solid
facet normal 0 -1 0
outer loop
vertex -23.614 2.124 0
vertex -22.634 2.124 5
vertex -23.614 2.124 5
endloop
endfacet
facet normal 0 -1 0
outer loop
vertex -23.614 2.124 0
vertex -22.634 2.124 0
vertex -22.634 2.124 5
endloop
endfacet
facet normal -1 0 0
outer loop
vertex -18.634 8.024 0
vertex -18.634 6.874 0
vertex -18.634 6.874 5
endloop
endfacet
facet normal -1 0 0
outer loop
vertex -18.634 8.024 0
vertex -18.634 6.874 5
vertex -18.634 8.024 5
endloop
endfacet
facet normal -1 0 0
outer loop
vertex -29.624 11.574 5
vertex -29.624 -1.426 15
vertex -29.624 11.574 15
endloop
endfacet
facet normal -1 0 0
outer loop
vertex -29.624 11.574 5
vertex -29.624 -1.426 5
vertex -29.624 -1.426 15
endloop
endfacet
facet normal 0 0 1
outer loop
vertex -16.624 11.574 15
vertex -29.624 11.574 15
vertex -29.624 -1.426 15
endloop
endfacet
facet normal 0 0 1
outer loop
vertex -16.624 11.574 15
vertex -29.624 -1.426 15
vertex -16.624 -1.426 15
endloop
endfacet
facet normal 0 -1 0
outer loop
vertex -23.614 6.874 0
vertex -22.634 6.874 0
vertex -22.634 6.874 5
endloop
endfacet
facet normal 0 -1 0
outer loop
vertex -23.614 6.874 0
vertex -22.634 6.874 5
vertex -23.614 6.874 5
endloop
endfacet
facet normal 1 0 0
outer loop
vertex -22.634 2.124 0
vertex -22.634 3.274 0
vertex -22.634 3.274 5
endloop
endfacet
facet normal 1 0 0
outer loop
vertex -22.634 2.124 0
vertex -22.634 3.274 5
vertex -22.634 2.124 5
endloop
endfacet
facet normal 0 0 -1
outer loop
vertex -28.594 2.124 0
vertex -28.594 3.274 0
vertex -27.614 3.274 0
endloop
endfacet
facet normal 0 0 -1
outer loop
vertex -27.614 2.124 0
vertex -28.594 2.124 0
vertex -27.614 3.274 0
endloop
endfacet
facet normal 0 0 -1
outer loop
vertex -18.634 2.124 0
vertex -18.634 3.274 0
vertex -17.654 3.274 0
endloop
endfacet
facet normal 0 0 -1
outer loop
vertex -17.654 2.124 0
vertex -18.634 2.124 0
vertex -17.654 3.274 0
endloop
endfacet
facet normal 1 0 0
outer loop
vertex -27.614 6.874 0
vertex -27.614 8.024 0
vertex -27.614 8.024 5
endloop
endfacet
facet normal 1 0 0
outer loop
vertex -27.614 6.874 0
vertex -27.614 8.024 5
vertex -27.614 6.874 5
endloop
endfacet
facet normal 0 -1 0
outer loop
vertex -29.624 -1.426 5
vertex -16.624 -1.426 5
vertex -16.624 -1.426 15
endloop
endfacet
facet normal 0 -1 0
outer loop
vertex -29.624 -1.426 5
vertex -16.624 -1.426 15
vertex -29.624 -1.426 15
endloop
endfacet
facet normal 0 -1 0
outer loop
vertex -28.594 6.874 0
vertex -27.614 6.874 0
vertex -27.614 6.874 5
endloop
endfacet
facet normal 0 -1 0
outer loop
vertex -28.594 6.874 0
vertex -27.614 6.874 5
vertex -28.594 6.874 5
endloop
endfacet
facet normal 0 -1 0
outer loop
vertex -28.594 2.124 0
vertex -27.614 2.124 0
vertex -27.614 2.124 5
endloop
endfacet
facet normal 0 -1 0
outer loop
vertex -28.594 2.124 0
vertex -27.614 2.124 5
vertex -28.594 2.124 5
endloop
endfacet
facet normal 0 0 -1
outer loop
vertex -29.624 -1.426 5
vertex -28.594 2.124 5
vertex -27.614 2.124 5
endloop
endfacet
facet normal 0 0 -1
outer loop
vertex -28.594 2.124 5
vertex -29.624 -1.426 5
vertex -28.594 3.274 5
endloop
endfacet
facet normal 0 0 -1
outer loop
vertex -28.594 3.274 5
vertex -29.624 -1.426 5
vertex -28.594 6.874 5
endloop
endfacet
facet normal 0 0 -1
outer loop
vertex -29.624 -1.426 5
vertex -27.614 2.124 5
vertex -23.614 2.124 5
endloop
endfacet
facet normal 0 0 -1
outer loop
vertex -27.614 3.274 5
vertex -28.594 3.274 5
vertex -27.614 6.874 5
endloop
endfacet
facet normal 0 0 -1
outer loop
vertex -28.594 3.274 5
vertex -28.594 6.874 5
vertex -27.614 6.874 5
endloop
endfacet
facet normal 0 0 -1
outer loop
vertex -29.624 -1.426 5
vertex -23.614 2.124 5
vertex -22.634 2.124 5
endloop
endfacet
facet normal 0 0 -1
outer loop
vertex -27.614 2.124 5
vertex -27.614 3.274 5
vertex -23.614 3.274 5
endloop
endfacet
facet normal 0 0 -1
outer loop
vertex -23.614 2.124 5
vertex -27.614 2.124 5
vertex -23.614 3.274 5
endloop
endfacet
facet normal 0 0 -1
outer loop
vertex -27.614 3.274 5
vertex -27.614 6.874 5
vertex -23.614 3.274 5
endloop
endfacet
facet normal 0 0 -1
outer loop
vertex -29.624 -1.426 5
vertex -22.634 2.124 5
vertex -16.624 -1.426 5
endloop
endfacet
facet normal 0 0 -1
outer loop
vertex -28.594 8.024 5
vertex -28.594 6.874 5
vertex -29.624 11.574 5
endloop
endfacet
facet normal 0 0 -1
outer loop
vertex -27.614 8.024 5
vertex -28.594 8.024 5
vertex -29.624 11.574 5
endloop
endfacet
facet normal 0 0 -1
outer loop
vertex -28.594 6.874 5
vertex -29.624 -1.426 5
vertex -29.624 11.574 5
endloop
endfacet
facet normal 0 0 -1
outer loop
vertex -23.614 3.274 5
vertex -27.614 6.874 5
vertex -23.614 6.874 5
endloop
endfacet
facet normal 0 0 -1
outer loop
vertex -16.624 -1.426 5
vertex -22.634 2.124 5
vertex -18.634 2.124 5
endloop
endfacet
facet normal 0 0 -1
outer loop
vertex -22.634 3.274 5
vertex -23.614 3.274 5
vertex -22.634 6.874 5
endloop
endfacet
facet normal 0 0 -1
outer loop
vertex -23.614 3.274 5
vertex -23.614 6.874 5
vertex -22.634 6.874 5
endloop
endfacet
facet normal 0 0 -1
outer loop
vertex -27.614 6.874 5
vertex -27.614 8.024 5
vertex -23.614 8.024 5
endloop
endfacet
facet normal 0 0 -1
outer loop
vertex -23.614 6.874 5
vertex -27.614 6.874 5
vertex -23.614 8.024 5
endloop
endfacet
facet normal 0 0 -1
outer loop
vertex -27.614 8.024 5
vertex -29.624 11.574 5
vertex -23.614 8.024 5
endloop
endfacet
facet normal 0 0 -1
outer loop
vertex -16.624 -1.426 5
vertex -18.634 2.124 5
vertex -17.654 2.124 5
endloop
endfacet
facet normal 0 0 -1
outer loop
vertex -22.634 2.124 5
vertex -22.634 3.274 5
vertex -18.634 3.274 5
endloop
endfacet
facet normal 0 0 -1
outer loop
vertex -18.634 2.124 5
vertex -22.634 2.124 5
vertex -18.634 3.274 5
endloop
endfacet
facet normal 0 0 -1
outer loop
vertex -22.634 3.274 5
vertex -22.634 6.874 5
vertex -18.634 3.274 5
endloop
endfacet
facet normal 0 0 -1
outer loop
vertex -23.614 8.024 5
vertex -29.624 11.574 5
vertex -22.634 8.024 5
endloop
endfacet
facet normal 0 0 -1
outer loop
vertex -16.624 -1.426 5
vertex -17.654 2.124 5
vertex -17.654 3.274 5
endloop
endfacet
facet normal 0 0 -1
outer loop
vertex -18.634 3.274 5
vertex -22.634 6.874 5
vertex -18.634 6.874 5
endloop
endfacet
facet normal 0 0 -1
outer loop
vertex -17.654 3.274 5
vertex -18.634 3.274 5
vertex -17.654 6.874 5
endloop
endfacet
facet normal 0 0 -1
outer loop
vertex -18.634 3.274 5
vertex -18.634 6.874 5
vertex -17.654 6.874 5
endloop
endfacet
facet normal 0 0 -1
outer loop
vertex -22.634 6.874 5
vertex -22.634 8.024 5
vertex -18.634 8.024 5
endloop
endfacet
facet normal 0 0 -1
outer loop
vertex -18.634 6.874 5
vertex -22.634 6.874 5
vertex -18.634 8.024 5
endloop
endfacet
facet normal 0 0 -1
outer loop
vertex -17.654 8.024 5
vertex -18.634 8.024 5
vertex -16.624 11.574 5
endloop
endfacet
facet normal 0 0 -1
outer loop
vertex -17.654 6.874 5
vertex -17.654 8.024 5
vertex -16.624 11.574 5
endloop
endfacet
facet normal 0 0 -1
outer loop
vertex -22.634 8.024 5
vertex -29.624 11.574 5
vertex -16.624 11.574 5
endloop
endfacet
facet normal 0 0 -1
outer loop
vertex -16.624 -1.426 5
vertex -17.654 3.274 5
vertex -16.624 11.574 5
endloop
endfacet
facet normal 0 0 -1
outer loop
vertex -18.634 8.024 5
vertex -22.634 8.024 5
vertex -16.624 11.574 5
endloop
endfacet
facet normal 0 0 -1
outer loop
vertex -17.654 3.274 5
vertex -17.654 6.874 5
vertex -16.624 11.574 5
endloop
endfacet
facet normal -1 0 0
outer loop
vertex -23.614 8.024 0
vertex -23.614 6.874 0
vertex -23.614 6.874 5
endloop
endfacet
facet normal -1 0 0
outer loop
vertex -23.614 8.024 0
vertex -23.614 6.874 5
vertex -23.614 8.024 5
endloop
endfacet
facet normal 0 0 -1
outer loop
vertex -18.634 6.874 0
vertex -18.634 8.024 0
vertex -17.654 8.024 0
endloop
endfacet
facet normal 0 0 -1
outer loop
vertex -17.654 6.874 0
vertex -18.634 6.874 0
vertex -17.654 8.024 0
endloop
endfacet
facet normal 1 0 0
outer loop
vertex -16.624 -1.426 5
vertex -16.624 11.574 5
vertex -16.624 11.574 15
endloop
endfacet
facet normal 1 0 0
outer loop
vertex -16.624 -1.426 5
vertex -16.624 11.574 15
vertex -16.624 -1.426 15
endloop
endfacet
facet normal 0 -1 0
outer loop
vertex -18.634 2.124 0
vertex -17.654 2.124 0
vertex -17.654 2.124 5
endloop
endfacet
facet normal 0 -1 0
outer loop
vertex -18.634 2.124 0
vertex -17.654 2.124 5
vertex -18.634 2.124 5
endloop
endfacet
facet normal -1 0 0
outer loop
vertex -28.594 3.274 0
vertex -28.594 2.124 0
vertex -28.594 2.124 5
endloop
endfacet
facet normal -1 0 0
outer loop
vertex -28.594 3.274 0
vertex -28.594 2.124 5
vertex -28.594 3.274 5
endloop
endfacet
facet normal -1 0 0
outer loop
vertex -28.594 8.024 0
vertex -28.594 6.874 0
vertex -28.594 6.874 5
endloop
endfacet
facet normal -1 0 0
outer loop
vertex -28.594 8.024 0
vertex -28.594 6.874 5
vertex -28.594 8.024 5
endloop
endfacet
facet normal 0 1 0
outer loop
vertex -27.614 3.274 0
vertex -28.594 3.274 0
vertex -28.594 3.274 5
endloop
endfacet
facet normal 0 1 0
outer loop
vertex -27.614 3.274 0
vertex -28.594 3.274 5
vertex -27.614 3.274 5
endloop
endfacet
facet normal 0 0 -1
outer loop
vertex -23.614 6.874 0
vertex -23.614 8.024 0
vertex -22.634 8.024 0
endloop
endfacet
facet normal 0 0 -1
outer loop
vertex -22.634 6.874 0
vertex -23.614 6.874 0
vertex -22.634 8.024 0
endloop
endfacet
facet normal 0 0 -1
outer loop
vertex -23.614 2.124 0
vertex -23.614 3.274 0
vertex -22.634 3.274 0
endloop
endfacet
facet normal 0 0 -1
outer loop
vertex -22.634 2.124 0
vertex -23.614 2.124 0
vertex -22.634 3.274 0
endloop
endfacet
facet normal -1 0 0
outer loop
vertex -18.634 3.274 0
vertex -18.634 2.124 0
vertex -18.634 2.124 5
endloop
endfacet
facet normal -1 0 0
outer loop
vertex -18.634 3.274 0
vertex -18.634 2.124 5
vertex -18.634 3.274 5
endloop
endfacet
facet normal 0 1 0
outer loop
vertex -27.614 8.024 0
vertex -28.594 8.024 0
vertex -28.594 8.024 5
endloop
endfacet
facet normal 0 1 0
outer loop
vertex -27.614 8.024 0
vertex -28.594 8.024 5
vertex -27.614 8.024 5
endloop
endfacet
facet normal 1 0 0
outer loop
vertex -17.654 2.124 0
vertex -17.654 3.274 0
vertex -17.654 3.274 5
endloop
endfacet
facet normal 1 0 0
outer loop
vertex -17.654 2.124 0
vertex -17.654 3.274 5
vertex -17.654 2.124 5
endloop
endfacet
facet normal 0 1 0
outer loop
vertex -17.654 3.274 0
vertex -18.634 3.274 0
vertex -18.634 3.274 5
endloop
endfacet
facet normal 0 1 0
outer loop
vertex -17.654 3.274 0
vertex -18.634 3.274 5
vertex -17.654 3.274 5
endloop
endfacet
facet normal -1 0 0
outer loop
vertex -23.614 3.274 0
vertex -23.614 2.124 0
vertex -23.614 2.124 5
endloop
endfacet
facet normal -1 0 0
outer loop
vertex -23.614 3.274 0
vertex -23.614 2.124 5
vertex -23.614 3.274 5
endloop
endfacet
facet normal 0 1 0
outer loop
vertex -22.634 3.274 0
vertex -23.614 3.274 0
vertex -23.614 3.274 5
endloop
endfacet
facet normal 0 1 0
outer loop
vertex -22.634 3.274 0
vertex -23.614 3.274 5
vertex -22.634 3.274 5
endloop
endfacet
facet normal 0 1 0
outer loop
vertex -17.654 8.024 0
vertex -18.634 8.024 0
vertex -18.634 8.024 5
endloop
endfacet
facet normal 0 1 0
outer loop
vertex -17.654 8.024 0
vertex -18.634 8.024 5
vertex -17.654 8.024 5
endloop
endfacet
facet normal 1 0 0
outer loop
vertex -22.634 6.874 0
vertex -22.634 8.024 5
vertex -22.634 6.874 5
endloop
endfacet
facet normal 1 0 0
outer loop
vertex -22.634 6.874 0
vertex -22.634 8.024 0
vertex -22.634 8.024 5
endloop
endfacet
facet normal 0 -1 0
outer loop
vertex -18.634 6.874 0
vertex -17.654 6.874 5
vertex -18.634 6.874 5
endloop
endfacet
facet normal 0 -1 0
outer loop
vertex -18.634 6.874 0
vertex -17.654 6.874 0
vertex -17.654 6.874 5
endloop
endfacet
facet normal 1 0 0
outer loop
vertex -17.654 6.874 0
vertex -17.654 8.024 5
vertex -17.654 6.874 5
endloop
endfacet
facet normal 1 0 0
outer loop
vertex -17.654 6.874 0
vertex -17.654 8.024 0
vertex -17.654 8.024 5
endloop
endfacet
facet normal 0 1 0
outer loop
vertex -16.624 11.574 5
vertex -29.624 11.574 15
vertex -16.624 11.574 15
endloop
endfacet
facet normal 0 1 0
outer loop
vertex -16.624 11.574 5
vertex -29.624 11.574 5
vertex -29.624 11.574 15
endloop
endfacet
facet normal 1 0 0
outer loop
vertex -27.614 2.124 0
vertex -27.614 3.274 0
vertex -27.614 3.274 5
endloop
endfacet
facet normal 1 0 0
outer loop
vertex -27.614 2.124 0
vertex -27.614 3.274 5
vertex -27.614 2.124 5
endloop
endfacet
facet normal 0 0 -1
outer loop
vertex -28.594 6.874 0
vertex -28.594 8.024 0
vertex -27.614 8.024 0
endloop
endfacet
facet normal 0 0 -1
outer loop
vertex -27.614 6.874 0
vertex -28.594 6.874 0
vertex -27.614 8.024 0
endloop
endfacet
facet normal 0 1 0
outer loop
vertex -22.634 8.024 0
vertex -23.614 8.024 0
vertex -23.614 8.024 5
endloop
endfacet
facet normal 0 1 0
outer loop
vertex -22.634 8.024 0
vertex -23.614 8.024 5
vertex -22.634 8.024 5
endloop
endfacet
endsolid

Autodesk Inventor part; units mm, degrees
ref_plane "YZ Plane" through (0, 0, 0) normal (1, 0, 0) x (0, 1, 0)
ref_plane "XZ Plane" through (0, 0, 0) normal (0, 1, 0) x (-1, 0, 0)
ref_plane "XY Plane" through (0, 0, 0) normal (0, 0, 1) x (1, 0, 0)
sketch "スケッチ1" plane through (0, 0, 0) normal (0, 0, 1) x (1, 0, 0)
  line L0 (-28.5941, 8.0239) -> (-27.6141, 8.0239)
  line L1 (-27.6141, 8.0239) -> (-27.6141, 6.8739)
  line L2 (-27.6141, 6.8739) -> (-28.5941, 6.8739)
  line L3 (-28.5941, 6.8739) -> (-28.5941, 8.0239)
  line L4 (-23.6141, 8.0239) -> (-22.6341, 8.0239)
  line L5 (-22.6341, 8.0239) -> (-22.6341, 6.8739)
  line L6 (-22.6341, 6.8739) -> (-23.6141, 6.8739)
  line L7 (-23.6141, 6.8739) -> (-23.6141, 8.0239)
  line L8 (-18.6341, 8.0239) -> (-17.6541, 8.0239)
  line L9 (-17.6541, 8.0239) -> (-17.6541, 6.8739)
  line L10 (-17.6541, 6.8739) -> (-18.6341, 6.8739)
  line L11 (-18.6341, 6.8739) -> (-18.6341, 8.0239)
  line L12 (-28.5941, 3.2739) -> (-27.6141, 3.2739)
  line L13 (-27.6141, 3.2739) -> (-27.6141, 2.1239)
  line L14 (-27.6141, 2.1239) -> (-28.5941, 2.1239)
  line L15 (-28.5941, 2.1239) -> (-28.5941, 3.2739)
  line L16 (-23.6141, 3.2739) -> (-22.6341, 3.2739)
  line L17 (-22.6341, 3.2739) -> (-22.6341, 2.1239)
  line L18 (-22.6341, 2.1239) -> (-23.6141, 2.1239)
  line L19 (-23.6141, 2.1239) -> (-23.6141, 3.2739)
  line L20 (-18.6341, 3.2739) -> (-17.6541, 3.2739)
  line L21 (-17.6541, 3.2739) -> (-17.6541, 2.1239)
  line L22 (-17.6541, 2.1239) -> (-18.6341, 2.1239)
  line L23 (-18.6341, 2.1239) -> (-18.6341, 3.2739)
  dimension "d2" = 0.98
  dimension "d3" = 1.15
  dimension "d4" = 0.98
  dimension "d5" = 1.15
  dimension "d6" = 0.98
  dimension "d7" = 1.15
  dimension "d8" = 0.98
  dimension "d9" = 1.15
  dimension "d10" = 0.98
  dimension "d11" = 1.15
  dimension "d12" = 0.98
  dimension "d13" = 1.15
  dimension "d14" = 4
  dimension "d15" = 0
  dimension "d16" = 0
  dimension "d17" = 4
  dimension "d18" = 0
  dimension "d19" = 0
  dimension "d20" = 3.6
  dimension "d21" = 4
  dimension "d22" = 0
  dimension "d23" = 0
extrude "押し出し1" add sketch "スケッチ1" along normal blind 5
sketch "スケッチ2" plane through (0, 0, 5) normal (0, 0, 1) x (1, 0, 0)
  line L0 (-29.6241, 11.5739) -> (-16.6241, 11.5739)
  line L1 (-16.6241, 11.5739) -> (-16.6241, -1.4261)
  line L2 (-16.6241, -1.4261) -> (-29.6241, -1.4261)
  line L3 (-29.6241, -1.4261) -> (-29.6241, 11.5739)
  line L4 (-17.6541, 8.0239) -> (-18.6341, 8.0239) projected
  line L5 (-17.6541, 2.1239) -> (-17.6541, 3.2739) projected
  line L6 (-28.5941, 3.2739) -> (-28.5941, 2.1239) projected
  point P0 (0, 0)
  dimension "d26" = 13
  dimension "d27" = 13
  dimension "d28" = 3.55
  dimension "d29" = 10.94
  dimension "d30" = 1.03
extrude "押し出し2" add sketch "スケッチ2" along normal blind 10
equation "\"BendRadius\" = Thickness"
equation "\"BendReliefWidth\" = Thickness"
equation "\"BendReliefDepth\" = 0.5 * Thickness"
equation "\"CornerReliefSize\" = 4 * Thickness"
equation "\"MinimumRemnant\" = 2 * Thickness"
equation "\"TransitionRadius\" = BendRadius"
equation "\"JacobiRadiusSize\" = BendRadius"
equation "\"GapSize\" = Thickness"
equation "\"Thickness\" = 0.5"
properties part number "pin"
